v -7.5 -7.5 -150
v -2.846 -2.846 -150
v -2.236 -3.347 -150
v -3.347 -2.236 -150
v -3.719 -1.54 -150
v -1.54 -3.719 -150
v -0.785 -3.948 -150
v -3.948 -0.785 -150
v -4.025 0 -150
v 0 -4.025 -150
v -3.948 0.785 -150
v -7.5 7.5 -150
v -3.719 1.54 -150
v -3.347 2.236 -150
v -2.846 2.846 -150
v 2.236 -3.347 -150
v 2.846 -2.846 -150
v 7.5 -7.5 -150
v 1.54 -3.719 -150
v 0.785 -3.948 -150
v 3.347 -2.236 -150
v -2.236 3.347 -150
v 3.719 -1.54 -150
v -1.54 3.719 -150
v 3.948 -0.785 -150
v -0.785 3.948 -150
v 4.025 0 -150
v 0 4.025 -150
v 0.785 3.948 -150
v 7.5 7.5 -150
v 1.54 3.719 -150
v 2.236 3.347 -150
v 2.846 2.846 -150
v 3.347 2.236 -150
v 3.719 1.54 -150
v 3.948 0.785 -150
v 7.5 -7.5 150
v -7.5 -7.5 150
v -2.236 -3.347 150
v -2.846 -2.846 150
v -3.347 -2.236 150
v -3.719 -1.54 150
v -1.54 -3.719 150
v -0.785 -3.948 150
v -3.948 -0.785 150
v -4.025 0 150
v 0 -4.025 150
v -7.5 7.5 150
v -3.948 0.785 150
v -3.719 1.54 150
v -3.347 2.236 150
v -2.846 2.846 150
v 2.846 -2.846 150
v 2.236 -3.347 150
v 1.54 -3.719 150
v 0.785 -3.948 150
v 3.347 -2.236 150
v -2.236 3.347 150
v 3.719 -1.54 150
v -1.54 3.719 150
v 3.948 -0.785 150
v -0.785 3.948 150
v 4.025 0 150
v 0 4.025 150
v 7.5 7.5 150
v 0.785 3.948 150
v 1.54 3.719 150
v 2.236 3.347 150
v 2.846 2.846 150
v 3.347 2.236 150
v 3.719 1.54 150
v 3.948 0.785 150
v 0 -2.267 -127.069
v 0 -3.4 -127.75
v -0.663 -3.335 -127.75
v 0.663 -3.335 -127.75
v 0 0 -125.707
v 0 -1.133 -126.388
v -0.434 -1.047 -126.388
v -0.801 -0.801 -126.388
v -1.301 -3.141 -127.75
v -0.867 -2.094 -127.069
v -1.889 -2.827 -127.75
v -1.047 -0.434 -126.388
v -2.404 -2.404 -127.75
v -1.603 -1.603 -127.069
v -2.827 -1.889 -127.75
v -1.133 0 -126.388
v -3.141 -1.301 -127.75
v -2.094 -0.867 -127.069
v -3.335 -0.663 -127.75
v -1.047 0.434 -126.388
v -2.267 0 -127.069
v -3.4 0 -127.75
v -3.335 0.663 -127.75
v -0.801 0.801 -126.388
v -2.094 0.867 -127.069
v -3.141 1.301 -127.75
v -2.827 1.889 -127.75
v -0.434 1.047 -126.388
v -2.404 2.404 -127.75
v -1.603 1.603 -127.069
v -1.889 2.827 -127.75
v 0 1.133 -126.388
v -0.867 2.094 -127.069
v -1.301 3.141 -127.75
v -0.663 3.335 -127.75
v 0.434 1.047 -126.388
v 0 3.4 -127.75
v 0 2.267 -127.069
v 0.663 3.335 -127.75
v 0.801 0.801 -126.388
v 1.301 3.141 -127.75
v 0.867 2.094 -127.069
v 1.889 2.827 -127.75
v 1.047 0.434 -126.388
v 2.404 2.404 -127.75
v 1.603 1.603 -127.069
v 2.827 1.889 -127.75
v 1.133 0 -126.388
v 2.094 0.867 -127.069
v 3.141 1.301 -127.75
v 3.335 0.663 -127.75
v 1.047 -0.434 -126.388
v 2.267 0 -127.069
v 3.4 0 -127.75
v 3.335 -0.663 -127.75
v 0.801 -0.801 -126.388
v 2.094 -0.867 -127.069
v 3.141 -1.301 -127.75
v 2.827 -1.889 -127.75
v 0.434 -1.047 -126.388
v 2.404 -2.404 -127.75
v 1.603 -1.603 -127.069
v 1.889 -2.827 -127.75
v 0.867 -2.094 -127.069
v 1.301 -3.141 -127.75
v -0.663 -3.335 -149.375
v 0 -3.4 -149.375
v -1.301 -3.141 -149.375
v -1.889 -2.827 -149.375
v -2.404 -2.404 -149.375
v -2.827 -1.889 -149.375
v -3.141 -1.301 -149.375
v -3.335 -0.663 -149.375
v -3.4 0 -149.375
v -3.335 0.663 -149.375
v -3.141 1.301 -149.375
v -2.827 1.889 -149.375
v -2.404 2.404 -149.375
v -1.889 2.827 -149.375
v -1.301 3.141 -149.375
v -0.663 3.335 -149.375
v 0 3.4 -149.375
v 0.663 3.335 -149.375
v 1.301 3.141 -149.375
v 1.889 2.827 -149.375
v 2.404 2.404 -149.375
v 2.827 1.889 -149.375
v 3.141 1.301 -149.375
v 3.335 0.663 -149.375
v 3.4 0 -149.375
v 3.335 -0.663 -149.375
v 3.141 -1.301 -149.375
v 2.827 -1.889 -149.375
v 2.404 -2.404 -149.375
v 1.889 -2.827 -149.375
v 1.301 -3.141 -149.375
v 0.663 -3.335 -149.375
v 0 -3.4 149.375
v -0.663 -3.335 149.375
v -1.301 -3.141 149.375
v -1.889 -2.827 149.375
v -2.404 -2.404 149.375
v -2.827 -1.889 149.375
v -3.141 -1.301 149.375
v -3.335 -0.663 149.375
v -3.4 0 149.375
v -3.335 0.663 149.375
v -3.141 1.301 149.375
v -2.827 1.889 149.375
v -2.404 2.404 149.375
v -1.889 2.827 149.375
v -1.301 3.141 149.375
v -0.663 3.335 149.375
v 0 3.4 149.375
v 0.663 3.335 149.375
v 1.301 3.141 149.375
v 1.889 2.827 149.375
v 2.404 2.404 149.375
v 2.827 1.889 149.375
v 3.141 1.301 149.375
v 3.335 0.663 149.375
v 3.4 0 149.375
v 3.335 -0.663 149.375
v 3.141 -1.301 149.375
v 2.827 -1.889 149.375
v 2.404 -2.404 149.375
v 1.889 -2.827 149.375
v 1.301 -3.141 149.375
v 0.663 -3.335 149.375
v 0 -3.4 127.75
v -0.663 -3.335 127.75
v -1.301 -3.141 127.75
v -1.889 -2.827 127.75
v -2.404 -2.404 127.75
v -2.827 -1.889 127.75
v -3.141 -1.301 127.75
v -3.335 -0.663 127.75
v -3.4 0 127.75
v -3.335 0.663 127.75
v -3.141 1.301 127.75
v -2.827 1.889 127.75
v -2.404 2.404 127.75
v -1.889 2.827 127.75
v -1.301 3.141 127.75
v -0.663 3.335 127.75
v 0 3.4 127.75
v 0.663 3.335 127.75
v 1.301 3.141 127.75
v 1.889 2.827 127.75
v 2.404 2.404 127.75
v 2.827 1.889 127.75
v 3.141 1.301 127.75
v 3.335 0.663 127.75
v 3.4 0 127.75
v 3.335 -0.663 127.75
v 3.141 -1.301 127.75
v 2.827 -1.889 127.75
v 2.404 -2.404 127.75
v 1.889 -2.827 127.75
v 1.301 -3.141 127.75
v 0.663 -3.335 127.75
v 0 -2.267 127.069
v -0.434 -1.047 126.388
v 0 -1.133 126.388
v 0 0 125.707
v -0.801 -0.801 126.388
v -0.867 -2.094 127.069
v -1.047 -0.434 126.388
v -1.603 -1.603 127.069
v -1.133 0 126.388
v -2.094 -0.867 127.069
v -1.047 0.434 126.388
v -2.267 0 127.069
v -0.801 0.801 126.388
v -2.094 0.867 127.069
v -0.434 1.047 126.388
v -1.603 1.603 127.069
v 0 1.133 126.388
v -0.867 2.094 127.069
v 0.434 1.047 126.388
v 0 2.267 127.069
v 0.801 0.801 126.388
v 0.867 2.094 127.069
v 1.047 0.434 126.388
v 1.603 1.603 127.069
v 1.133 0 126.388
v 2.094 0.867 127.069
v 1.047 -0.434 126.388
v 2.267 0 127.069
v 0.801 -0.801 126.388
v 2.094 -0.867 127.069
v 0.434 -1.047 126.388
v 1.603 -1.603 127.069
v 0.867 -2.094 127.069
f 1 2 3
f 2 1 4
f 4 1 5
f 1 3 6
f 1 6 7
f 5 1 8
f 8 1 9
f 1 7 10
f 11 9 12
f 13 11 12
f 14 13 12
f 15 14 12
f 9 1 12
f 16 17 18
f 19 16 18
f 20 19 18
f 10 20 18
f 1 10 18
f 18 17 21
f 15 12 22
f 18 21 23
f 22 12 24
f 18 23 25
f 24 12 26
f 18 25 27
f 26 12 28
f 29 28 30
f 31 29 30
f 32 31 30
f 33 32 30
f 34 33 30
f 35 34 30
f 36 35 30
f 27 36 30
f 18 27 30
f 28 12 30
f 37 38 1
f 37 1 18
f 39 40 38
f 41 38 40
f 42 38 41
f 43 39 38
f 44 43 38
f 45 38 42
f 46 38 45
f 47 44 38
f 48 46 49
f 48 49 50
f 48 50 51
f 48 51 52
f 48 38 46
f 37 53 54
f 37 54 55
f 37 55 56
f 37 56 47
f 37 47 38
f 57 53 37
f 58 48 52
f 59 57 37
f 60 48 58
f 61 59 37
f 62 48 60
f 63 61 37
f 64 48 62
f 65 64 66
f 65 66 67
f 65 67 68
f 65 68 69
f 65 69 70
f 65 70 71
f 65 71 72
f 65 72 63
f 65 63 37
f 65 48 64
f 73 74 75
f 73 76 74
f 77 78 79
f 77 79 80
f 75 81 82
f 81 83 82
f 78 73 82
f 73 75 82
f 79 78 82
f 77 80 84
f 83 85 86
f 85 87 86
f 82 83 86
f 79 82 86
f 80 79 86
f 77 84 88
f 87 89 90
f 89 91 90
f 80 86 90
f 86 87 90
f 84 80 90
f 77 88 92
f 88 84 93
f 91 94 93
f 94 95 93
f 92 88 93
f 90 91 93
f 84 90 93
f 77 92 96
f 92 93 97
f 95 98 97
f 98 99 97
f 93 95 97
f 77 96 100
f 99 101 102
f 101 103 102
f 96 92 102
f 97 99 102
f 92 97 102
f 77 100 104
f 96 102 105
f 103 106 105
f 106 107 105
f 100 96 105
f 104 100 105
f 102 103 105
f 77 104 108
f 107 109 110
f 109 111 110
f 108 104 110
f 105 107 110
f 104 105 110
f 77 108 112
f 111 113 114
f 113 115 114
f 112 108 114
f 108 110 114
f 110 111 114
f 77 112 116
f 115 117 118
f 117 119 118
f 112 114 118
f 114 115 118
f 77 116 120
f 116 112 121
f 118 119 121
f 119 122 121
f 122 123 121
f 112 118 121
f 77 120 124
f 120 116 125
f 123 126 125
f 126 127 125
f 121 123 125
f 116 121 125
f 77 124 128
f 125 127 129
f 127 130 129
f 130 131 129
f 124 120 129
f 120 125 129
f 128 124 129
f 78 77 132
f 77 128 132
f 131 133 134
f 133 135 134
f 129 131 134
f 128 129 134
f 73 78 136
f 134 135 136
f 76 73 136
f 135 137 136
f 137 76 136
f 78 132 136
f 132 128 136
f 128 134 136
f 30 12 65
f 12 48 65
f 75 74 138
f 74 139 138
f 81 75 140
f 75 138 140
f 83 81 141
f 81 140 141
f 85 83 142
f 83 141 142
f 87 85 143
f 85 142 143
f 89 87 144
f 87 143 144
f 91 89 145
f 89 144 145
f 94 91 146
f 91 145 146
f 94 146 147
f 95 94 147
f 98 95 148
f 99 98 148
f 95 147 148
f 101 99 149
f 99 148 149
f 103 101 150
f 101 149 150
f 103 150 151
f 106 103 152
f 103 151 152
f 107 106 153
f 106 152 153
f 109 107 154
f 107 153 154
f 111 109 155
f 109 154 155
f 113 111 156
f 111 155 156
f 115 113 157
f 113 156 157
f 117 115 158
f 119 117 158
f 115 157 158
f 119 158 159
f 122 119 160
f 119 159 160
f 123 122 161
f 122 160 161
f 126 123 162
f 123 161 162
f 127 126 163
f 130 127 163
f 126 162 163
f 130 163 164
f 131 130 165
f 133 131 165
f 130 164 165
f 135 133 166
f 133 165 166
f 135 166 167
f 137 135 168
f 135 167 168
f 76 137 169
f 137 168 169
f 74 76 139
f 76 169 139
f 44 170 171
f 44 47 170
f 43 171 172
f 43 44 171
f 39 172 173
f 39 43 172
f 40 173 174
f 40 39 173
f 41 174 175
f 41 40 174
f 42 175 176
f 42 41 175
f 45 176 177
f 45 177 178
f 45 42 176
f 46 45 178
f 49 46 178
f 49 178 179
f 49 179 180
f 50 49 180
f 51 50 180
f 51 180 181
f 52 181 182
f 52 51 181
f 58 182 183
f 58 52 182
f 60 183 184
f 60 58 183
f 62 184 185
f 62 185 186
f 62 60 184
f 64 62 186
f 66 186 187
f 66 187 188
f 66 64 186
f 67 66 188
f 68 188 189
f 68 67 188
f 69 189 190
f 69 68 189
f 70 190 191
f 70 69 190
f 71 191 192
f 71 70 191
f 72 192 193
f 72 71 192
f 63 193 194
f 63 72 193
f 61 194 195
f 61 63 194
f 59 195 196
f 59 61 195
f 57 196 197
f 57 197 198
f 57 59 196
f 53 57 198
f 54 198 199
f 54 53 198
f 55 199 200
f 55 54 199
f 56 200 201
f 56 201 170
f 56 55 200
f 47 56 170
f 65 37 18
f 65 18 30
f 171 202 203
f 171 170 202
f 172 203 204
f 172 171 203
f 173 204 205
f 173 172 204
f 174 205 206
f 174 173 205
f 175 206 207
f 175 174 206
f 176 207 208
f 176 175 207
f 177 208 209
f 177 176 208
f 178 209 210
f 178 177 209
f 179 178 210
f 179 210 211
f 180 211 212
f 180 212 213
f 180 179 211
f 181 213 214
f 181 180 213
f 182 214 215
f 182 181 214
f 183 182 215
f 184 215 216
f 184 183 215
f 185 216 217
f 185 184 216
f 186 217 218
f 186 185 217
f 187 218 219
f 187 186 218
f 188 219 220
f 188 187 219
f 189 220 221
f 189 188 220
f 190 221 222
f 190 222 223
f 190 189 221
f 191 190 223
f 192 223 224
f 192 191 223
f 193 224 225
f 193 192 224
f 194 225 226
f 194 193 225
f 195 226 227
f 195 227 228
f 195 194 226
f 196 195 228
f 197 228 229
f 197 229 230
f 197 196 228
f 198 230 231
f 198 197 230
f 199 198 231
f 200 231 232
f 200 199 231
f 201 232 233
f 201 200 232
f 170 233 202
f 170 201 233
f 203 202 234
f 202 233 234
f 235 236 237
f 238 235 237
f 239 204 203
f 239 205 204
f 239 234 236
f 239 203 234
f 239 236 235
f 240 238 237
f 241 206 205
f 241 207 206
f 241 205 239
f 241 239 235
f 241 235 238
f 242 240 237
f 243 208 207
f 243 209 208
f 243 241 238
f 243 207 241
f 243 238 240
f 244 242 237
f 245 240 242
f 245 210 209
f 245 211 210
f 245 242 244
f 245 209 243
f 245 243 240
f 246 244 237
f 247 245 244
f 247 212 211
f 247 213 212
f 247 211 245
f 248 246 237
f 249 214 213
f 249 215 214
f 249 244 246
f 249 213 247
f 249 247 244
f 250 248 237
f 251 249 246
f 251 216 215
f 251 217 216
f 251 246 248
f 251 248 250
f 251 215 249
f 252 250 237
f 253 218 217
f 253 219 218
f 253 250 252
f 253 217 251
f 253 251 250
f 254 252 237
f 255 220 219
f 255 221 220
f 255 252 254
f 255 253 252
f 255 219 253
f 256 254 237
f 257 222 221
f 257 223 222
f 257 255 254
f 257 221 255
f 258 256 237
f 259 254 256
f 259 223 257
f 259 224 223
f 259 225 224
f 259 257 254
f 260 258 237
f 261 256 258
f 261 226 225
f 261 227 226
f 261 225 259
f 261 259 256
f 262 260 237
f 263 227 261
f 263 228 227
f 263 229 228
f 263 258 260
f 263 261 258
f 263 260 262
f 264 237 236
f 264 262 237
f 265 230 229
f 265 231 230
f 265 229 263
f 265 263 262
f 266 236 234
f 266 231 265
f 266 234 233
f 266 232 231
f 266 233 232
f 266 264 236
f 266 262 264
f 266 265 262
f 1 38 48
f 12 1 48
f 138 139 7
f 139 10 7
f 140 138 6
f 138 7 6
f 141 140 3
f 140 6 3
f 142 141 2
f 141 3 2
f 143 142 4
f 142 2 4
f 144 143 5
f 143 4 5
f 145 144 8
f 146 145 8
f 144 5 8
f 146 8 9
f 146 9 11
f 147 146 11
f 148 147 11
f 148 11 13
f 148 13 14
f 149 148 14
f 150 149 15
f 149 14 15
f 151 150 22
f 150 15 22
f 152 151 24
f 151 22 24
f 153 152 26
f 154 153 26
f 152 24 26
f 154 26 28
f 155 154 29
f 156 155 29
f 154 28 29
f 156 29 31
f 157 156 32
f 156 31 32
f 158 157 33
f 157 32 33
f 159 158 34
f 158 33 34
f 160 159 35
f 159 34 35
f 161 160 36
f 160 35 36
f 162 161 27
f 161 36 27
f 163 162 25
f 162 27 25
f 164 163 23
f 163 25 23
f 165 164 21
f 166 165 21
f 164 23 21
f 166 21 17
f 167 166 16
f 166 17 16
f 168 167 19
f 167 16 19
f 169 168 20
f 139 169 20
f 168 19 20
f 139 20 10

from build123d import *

# Parameters (mm, degrees)
SKETCH1_W           = 15
SKETCH1_H           = 15
BOSS_EXTRUDE1_DEPTH = 150


with BuildPart() as part:
    # Sketch1 → Boss-Extrude1 (new, symmetric)
    with BuildSketch(Plane.XY):
        Rectangle(SKETCH1_W, SKETCH1_H)
    extrude(amount=BOSS_EXTRUDE1_DEPTH, both=True)

    # Sketch3 → M8 Tapped Hole1 (revolve, cut)
    with BuildSketch(Plane(origin=(0, 0, 150), x_dir=(0, -1, 0), z_dir=(1, 0, 0))):
        Polygon((0, 0), (0, 24.292926105), (3.4, 22.25), (3.4, 0.625), (4.025, 0), align=None)
    m8_tapped_hole1 = revolve(axis=Axis((0, 0, 156.35), (0, 0, -1)), mode=Mode.SUBTRACT)

    # Mirror1: M8 Tapped Hole1 across plane
    add(m8_tapped_hole1.mirror(Plane.XY), mode=Mode.SUBTRACT)


solid = part.part
